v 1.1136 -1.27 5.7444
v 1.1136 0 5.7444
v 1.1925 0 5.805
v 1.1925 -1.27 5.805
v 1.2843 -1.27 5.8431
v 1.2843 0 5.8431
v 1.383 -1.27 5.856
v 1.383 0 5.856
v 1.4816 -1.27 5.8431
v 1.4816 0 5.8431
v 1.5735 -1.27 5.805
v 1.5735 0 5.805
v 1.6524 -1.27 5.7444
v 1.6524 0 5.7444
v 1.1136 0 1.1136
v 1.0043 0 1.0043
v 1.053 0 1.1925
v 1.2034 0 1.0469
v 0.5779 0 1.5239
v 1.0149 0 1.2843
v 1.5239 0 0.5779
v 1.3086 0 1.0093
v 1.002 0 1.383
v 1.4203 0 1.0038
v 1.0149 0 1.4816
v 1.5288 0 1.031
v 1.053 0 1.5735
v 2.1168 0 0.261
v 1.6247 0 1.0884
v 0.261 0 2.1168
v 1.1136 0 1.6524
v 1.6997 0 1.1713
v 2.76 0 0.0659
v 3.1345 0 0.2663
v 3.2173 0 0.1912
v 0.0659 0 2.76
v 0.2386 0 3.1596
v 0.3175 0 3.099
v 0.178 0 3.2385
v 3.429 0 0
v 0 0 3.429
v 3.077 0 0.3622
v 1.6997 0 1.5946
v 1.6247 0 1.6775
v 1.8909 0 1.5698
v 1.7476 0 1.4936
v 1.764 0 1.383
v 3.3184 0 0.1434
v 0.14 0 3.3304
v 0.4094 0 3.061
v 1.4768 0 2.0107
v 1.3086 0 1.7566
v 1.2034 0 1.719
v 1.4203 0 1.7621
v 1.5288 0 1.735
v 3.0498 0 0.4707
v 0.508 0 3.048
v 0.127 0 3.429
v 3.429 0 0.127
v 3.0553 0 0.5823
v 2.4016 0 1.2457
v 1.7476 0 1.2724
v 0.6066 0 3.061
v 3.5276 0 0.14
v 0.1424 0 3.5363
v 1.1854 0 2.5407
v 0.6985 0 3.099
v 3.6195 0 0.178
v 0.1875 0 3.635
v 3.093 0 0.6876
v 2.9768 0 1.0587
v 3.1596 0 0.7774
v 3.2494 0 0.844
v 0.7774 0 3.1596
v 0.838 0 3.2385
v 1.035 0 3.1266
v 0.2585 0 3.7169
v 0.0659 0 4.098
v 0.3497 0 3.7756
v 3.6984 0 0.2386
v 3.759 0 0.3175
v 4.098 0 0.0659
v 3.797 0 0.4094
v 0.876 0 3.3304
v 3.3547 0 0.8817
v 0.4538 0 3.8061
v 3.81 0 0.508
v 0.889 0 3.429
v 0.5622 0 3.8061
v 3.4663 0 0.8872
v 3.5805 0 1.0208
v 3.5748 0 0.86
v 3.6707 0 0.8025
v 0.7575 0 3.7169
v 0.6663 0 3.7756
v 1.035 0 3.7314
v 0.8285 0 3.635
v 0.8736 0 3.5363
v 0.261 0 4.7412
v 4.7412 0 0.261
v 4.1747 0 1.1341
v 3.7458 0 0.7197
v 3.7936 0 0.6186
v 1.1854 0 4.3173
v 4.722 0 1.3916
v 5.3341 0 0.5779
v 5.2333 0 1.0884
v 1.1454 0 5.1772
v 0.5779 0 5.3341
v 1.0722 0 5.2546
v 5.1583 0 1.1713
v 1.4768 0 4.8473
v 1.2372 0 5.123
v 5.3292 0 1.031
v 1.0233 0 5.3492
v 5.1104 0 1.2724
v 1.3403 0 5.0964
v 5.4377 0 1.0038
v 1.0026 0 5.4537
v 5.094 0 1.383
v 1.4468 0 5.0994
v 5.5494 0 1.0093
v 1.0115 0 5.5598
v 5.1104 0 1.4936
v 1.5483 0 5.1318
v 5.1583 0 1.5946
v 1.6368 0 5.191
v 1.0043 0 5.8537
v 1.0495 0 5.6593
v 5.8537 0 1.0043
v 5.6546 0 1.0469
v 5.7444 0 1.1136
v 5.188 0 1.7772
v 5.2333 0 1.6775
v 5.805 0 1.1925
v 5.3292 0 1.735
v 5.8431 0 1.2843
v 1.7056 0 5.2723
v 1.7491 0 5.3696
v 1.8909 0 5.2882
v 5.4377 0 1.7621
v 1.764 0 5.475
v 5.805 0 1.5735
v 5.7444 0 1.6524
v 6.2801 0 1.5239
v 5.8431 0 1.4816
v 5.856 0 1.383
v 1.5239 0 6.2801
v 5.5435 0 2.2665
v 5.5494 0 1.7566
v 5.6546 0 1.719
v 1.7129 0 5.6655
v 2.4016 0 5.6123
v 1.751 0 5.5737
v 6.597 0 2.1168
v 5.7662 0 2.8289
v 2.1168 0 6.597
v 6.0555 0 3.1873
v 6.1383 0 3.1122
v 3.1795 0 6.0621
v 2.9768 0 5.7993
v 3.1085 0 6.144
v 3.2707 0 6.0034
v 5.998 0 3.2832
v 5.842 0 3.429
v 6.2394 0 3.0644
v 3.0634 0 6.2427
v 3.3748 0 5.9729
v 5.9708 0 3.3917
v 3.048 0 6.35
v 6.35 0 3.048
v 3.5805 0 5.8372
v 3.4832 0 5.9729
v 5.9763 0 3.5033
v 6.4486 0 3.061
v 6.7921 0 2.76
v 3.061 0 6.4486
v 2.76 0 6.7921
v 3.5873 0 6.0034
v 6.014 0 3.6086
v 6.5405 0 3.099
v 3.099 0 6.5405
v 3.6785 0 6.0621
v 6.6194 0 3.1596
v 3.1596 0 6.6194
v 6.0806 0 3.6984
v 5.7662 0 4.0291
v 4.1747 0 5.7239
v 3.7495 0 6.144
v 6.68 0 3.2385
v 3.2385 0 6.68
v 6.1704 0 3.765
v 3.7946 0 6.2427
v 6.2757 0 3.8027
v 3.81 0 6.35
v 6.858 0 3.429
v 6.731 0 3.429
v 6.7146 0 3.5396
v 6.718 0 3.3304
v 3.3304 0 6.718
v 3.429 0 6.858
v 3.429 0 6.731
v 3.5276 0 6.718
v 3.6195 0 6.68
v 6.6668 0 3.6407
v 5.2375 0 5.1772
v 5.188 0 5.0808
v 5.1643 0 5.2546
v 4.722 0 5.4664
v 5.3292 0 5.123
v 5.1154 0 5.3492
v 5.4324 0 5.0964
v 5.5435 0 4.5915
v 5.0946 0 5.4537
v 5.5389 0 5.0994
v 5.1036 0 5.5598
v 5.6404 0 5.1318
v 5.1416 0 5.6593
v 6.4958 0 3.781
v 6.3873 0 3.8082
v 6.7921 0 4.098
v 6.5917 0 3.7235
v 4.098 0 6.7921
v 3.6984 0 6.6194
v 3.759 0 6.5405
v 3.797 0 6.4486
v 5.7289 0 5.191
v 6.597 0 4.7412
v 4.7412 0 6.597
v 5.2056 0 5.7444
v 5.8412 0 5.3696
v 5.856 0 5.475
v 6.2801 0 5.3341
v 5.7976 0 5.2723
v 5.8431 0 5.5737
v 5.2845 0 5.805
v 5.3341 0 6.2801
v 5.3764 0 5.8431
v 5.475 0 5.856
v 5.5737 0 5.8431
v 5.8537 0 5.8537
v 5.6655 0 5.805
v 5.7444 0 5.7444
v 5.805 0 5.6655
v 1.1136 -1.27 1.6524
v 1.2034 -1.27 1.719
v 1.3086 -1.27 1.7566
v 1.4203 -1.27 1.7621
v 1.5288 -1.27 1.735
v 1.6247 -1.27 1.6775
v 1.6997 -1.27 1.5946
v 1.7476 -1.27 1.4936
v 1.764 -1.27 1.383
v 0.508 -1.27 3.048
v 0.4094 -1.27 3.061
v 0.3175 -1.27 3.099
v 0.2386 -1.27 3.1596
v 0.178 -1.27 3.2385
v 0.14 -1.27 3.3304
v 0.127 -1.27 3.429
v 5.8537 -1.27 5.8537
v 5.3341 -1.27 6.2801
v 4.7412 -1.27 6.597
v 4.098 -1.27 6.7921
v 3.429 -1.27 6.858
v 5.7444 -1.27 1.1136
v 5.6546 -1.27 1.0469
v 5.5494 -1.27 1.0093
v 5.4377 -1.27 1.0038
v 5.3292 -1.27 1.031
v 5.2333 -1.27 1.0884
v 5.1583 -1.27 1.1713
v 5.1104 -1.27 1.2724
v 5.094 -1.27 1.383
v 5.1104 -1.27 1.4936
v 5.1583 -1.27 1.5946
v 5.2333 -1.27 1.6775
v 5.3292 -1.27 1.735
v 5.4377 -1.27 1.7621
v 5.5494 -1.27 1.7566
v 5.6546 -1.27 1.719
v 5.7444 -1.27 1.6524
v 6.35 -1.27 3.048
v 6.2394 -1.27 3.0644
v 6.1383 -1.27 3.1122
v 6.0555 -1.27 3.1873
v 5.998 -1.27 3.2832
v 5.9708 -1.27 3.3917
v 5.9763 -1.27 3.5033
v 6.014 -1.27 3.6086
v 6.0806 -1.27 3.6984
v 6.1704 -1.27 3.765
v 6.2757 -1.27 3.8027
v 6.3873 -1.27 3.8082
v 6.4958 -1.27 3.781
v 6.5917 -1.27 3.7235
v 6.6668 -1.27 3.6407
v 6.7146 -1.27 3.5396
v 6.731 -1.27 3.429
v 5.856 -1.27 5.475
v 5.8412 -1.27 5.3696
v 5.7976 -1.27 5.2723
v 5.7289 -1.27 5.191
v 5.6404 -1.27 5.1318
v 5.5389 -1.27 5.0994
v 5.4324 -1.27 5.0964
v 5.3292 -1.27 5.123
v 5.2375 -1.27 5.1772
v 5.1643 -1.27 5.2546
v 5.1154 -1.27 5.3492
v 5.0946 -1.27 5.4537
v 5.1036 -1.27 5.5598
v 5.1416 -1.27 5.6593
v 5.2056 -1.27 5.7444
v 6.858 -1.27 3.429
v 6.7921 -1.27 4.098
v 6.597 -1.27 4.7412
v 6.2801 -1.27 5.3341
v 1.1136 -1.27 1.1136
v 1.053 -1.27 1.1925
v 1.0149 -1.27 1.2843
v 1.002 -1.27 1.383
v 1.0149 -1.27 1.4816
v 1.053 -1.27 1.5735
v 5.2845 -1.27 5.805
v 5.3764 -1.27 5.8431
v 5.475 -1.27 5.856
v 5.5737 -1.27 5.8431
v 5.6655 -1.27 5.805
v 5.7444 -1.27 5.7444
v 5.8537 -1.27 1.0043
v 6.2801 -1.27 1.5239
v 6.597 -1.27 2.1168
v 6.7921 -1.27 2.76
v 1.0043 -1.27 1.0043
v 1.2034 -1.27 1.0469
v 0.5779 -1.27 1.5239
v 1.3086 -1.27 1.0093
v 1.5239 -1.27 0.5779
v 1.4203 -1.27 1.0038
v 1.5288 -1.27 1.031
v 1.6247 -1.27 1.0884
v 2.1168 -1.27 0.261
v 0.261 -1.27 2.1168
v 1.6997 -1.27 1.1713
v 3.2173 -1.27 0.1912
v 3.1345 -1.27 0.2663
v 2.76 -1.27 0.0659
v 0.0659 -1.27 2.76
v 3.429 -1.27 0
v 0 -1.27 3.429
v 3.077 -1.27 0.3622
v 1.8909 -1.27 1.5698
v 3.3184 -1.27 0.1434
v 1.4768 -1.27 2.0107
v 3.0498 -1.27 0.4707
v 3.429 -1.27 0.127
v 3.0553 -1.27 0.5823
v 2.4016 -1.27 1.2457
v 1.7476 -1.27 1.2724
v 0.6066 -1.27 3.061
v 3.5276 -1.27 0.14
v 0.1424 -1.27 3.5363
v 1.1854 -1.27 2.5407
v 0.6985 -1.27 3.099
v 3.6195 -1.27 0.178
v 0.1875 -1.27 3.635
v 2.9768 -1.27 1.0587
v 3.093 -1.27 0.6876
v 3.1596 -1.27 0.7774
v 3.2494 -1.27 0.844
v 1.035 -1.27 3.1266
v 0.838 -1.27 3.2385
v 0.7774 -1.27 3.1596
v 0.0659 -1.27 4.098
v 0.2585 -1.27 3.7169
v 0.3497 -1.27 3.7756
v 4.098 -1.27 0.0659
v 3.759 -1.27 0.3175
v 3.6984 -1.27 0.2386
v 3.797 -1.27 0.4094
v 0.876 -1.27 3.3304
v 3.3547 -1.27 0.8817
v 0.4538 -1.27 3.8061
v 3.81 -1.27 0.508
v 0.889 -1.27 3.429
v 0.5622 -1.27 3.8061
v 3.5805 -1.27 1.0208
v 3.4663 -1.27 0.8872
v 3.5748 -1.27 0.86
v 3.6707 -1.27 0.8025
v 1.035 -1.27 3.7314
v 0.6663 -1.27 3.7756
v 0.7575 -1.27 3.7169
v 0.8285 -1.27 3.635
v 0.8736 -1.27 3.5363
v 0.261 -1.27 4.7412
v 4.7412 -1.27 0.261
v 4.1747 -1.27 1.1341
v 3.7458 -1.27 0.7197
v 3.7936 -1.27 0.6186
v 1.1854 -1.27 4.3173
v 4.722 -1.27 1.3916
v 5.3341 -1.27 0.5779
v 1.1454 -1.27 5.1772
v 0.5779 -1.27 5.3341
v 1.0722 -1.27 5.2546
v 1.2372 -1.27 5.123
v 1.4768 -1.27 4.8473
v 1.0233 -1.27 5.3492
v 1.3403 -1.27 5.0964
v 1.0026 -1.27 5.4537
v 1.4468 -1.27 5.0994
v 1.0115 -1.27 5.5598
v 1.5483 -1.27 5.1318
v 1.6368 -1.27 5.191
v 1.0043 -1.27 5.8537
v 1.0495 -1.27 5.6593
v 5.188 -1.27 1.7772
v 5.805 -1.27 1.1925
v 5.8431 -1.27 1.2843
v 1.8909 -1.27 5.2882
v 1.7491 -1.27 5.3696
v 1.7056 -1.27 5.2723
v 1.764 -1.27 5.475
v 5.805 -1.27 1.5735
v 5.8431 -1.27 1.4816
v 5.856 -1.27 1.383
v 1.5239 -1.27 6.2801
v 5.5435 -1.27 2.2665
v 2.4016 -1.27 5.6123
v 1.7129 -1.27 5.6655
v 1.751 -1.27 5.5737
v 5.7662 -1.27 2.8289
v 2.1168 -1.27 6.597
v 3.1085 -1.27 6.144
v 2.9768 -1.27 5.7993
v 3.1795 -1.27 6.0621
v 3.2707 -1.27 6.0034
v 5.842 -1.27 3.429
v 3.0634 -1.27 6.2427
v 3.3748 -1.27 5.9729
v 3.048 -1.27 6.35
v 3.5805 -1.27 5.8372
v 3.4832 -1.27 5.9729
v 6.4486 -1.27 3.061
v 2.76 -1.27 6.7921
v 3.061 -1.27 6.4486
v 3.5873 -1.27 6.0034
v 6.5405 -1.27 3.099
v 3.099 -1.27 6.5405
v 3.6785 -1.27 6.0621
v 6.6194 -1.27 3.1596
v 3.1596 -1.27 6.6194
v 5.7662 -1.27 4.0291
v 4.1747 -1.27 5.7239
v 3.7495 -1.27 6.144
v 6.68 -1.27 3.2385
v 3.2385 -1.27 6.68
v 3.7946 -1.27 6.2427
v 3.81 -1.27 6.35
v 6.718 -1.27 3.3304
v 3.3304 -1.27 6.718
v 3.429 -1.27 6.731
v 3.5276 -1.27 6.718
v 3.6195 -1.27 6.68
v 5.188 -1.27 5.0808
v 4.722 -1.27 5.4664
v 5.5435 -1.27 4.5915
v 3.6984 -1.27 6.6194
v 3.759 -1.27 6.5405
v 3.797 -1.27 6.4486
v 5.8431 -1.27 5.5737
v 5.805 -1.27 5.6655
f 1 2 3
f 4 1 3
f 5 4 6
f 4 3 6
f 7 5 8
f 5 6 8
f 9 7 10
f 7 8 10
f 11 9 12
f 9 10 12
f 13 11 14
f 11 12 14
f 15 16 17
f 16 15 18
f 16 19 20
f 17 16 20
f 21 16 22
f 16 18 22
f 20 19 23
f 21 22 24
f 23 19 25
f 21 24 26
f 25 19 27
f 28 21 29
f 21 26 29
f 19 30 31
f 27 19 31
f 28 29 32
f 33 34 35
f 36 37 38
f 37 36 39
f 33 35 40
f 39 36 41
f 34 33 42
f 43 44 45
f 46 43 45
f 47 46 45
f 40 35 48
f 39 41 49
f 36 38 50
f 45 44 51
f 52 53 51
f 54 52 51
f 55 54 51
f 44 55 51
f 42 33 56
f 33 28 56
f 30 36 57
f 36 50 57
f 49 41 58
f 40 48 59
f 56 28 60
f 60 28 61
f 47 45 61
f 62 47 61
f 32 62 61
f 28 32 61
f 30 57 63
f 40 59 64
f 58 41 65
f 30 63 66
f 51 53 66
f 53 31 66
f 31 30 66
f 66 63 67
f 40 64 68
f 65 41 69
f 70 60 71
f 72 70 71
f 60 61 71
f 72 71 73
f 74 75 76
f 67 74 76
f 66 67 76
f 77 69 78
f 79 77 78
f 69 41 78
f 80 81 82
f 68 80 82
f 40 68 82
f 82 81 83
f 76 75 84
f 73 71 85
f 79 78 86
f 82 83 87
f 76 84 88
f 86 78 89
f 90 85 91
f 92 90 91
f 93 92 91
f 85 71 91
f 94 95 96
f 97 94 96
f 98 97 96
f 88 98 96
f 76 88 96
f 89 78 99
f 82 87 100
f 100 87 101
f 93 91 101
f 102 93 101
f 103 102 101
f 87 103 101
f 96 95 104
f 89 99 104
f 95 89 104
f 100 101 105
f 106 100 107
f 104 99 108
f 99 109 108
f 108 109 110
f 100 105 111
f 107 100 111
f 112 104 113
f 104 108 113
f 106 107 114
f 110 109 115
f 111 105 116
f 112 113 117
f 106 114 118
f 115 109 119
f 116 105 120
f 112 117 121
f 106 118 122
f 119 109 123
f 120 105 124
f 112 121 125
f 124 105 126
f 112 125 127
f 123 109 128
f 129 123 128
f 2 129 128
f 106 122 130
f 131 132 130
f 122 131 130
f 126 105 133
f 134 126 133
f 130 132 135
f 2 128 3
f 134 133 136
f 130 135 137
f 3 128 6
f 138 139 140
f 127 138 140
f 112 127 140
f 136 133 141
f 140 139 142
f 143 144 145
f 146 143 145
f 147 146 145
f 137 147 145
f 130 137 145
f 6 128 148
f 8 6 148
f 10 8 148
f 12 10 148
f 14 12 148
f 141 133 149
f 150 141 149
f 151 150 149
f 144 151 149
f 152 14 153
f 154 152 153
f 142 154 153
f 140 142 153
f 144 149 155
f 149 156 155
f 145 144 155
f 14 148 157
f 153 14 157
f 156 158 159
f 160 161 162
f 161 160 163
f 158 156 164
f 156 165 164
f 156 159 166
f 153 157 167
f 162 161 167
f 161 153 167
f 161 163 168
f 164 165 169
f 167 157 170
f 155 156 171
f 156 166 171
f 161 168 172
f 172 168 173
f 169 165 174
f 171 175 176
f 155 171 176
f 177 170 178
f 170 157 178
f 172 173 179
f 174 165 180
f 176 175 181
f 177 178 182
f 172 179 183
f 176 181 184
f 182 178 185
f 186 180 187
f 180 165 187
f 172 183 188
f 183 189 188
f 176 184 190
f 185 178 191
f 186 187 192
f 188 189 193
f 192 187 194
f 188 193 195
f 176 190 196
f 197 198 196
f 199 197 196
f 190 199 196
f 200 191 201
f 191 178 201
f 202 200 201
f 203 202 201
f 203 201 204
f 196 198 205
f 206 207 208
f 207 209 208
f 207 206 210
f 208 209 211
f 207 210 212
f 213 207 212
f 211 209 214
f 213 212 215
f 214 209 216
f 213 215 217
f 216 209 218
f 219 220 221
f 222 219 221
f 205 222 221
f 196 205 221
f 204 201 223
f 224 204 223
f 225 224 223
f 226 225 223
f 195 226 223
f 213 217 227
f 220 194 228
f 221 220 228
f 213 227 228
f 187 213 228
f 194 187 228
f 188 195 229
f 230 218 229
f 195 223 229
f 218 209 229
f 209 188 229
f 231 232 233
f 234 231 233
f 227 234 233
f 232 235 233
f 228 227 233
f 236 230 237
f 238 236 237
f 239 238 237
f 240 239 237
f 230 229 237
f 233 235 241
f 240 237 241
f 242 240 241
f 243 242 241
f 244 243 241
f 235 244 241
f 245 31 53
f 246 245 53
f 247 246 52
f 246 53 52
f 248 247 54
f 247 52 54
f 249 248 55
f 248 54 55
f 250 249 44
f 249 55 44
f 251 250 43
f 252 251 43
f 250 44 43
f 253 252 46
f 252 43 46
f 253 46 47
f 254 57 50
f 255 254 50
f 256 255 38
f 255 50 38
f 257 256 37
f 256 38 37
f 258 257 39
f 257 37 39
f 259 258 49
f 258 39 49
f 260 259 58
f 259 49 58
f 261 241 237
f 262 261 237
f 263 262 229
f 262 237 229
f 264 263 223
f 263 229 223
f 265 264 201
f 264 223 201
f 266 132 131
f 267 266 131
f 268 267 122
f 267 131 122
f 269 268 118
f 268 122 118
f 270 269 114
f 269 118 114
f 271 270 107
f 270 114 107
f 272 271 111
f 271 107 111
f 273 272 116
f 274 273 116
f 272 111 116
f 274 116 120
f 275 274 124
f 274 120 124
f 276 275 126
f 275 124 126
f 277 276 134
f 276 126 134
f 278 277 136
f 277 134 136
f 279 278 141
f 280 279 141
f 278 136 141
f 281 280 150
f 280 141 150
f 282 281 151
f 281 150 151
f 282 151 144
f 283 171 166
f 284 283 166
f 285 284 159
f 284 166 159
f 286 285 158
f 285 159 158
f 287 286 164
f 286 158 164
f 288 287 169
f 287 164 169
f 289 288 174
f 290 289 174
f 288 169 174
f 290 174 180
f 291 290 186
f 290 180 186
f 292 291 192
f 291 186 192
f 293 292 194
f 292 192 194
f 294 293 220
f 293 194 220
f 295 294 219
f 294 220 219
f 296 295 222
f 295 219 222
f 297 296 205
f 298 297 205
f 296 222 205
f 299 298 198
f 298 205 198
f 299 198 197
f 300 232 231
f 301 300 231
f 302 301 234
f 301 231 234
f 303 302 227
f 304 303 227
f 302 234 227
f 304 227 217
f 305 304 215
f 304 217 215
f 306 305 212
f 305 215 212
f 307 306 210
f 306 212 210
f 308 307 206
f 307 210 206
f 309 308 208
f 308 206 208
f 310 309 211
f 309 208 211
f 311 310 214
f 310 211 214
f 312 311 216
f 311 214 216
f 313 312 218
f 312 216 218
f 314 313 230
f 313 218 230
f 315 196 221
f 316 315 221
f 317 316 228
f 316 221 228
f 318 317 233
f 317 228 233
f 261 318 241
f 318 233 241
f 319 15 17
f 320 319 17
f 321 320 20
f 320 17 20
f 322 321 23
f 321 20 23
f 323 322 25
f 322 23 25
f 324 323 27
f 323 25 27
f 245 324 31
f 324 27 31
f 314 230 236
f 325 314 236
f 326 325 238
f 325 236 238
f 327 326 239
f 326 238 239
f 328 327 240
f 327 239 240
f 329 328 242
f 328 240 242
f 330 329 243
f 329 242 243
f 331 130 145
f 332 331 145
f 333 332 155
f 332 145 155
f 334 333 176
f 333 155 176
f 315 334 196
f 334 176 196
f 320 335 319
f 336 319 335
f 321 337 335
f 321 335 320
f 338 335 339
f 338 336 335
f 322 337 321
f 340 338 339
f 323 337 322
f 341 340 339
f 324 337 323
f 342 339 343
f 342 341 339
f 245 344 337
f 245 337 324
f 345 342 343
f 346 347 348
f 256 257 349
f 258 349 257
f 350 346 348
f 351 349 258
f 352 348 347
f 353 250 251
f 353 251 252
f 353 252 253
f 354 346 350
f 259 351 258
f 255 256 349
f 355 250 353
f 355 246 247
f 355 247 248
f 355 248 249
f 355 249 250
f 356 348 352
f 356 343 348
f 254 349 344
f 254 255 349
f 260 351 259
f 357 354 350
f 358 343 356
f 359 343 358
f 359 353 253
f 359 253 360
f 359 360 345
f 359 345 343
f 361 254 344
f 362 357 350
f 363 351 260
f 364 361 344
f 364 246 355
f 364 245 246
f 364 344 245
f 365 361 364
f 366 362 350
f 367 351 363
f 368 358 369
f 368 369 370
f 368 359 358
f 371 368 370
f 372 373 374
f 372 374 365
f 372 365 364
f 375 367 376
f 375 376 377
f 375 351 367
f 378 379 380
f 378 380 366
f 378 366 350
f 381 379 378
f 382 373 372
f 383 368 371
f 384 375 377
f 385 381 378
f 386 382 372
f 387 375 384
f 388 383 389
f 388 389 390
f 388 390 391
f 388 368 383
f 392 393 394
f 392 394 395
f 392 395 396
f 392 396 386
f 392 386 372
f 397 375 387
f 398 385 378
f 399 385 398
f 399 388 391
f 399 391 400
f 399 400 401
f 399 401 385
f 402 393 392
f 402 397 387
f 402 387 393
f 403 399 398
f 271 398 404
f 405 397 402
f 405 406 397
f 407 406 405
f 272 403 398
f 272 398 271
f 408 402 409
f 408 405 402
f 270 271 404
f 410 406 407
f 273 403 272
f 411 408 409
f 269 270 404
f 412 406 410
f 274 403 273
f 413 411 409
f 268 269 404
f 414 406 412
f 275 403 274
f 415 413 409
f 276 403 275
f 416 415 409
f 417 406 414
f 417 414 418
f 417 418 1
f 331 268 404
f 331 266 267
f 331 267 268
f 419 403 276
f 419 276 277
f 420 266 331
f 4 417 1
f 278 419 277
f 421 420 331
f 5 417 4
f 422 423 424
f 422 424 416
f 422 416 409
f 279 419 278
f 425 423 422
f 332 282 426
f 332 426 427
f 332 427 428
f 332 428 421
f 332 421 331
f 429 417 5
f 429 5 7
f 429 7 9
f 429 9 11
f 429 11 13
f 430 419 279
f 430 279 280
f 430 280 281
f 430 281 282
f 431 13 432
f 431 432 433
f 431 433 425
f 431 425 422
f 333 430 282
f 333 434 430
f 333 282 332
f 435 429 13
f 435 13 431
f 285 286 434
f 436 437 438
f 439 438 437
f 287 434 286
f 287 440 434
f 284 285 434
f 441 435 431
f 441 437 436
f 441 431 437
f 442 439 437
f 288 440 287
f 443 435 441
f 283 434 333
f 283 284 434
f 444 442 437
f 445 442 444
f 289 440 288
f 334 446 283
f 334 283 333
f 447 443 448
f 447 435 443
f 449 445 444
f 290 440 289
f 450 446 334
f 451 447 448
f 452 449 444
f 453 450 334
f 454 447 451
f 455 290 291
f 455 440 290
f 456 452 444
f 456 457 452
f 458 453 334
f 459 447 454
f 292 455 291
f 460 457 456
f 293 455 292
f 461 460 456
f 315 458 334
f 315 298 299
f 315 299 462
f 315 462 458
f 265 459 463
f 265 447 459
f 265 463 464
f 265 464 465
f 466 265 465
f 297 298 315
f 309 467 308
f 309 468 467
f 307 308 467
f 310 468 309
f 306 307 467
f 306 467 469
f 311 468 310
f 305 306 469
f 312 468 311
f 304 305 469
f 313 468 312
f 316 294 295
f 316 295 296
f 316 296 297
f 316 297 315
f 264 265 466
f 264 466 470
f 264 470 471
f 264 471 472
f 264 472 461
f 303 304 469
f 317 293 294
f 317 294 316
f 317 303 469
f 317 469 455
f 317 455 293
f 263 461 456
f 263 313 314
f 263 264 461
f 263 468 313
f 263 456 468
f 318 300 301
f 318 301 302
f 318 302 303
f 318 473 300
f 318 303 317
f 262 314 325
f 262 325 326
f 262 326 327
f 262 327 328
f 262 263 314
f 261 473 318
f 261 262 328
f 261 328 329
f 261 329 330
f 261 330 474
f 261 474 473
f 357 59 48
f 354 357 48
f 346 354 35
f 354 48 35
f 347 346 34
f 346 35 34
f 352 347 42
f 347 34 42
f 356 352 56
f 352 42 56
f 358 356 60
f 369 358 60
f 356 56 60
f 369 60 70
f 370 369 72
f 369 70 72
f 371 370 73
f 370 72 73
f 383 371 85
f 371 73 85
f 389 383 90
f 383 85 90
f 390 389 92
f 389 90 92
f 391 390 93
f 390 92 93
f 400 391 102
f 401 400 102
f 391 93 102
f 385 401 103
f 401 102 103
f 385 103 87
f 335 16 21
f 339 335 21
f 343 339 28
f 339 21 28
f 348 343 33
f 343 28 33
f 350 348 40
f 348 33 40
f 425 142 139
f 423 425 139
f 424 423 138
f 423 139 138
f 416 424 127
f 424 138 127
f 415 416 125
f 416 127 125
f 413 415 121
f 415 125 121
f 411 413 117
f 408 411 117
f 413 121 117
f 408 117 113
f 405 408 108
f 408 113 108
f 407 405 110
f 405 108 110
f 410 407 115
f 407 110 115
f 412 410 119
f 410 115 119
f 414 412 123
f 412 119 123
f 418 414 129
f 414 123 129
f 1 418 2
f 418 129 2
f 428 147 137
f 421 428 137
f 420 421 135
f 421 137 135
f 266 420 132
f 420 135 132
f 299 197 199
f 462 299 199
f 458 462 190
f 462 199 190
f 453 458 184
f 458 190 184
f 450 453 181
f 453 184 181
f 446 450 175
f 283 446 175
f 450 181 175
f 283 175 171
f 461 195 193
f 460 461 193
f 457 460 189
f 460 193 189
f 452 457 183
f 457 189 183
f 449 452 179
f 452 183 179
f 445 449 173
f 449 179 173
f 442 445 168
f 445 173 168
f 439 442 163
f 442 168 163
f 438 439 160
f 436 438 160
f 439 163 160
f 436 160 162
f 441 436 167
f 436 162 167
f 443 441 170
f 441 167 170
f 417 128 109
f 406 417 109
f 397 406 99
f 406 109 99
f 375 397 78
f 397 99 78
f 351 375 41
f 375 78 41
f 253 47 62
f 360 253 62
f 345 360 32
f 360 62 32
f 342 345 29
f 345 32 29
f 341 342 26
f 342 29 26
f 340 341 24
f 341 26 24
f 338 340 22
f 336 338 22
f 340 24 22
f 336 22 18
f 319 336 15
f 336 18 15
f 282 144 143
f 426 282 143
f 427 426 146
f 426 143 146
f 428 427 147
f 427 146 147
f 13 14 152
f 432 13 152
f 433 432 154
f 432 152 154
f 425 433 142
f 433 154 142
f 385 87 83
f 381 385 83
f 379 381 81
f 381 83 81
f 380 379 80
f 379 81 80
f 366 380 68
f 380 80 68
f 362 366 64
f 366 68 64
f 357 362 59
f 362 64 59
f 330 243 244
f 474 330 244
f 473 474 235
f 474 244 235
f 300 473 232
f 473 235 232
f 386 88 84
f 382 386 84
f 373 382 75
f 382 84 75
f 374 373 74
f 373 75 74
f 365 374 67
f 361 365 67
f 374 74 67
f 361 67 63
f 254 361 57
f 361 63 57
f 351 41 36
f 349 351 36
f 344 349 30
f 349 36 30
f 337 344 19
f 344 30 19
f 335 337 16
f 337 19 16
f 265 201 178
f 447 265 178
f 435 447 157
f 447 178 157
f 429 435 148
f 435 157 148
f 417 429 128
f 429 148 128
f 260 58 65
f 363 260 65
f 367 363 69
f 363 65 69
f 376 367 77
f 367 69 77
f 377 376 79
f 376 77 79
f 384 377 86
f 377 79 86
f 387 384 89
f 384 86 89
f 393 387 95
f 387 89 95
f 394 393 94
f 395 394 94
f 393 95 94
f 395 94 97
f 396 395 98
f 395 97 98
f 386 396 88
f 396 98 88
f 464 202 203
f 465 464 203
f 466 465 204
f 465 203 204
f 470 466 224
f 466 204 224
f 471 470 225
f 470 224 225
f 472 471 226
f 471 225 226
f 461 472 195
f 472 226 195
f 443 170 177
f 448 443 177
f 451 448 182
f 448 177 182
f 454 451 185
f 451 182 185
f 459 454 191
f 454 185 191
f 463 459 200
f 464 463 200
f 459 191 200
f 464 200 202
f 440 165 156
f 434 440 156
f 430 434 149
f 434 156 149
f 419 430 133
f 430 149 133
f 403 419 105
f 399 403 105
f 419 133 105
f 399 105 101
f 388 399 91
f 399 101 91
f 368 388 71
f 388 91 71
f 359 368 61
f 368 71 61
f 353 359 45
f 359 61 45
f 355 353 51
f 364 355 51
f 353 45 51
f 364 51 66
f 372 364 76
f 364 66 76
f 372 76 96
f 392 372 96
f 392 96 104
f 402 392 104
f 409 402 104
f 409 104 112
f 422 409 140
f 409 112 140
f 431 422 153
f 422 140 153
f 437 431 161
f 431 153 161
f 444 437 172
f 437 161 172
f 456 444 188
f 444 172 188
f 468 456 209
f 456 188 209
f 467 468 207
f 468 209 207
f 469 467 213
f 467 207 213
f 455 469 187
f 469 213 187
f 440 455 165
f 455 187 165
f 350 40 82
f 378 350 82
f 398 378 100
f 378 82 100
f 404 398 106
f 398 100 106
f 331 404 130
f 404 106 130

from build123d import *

# Parameters (mm, degrees)
F1_DEPTH = 1.27


with BuildPart() as f1:
    # F0 (on Front) → F1 (new body)
    with BuildSketch(Plane.XZ):
        with BuildLine():
            ThreePointArc((5.8536691527, 1.0043308473), (6.596982917, 2.1167785104), (6.858, 3.429))
            ThreePointArc((6.858, 3.429), (6.596982917, 4.7412214896), (5.8536691527, 5.8536691527))
            ThreePointArc((5.8536691527, 5.8536691527), (4.7412214896, 6.596982917), (3.429, 6.858))
            ThreePointArc((3.429, 6.858), (2.1167785104, 6.596982917), (1.0043308473, 5.8536691527))
            ThreePointArc((1.0043308473, 5.8536691527), (0.261017083, 4.7412214896), (0, 3.429))
            ThreePointArc((0, 3.429), (0.261017083, 2.1167785104), (1.0043308473, 1.0043308473))
            ThreePointArc((1.0043308473, 1.0043308473), (2.1167785104, 0.261017083), (3.429, 0))
            ThreePointArc((3.429, 0), (4.7412214896, 0.261017083), (5.8536691527, 1.0043308473))
        make_face()
        with BuildLine():
            ThreePointArc((1.7639594426, 1.3829594426), (1.5287618304, 1.0309613408), (1.113551759, 1.113551759))
            ThreePointArc((1.113551759, 1.113551759), (1.0019594426, 1.3829594426), (1.113551759, 1.6523671263))
            ThreePointArc((1.113551759, 1.6523671263), (1.5287618304, 1.7349575445), (1.7639594426, 1.3829594426))
        make_face(mode=Mode.SUBTRACT)
        with BuildLine():
            ThreePointArc((3.81, 0.508), (3.6984076836, 0.2385923164), (3.429, 0.127))
            ThreePointArc((3.429, 0.127), (3.1595923164, 0.7774076836), (3.81, 0.508))
        make_face(mode=Mode.SUBTRACT)
        with BuildLine():
            ThreePointArc((5.8560405574, 1.3829594426), (5.8270386592, 1.2371570549), (5.744448241, 1.113551759))
            ThreePointArc((5.744448241, 1.113551759), (5.0940405574, 1.3829594426), (5.744448241, 1.6523671263))
            ThreePointArc((5.744448241, 1.6523671263), (5.8270386592, 1.5287618304), (5.8560405574, 1.3829594426))
        make_face(mode=Mode.SUBTRACT)
        with BuildLine():
            ThreePointArc((0.508, 3.048), (0.2385923164, 3.1595923164), (0.127, 3.429))
            ThreePointArc((0.127, 3.429), (0.508, 3.81), (0.889, 3.429))
            ThreePointArc((0.889, 3.429), (0.7774076836, 3.1595923164), (0.508, 3.048))
        make_face(mode=Mode.SUBTRACT)
        with BuildLine():
            ThreePointArc((1.7639594426, 5.4750405574), (1.2371570549, 5.1230424555), (1.113551759, 5.744448241))
            ThreePointArc((1.113551759, 5.744448241), (1.3829594426, 5.8560405574), (1.6523671263, 5.744448241))
            ThreePointArc((1.6523671263, 5.744448241), (1.7349575445, 5.6208429451), (1.7639594426, 5.4750405574))
        make_face(mode=Mode.SUBTRACT)
        with BuildLine():
            ThreePointArc((1.016, 3.429), (3.429, 5.842), (5.842, 3.429))
            ThreePointArc((5.842, 3.429), (3.429, 1.016), (1.016, 3.429))
        make_face(mode=Mode.SUBTRACT)
        with BuildLine():
            ThreePointArc((6.35, 3.048), (6.0805923164, 3.6984076836), (6.731, 3.429))
            ThreePointArc((6.731, 3.429), (6.6194076836, 3.1595923164), (6.35, 3.048))
        make_face(mode=Mode.SUBTRACT)
        with BuildLine():
            ThreePointArc((3.048, 6.35), (3.1595923164, 6.6194076836), (3.429, 6.731))
            ThreePointArc((3.429, 6.731), (3.6984076836, 6.6194076836), (3.81, 6.35))
            ThreePointArc((3.81, 6.35), (3.429, 5.969), (3.048, 6.35))
        make_face(mode=Mode.SUBTRACT)
        with BuildLine():
            ThreePointArc((5.2056328737, 5.744448241), (5.4750405574, 5.8560405574), (5.744448241, 5.744448241))
            ThreePointArc((5.744448241, 5.744448241), (5.8270386592, 5.6208429451), (5.8560405574, 5.4750405574))
            ThreePointArc((5.8560405574, 5.4750405574), (5.3292381696, 5.1230424555), (5.2056328737, 5.744448241))
        make_face(mode=Mode.SUBTRACT)
    extrude(amount=F1_DEPTH)


solid = f1.part
